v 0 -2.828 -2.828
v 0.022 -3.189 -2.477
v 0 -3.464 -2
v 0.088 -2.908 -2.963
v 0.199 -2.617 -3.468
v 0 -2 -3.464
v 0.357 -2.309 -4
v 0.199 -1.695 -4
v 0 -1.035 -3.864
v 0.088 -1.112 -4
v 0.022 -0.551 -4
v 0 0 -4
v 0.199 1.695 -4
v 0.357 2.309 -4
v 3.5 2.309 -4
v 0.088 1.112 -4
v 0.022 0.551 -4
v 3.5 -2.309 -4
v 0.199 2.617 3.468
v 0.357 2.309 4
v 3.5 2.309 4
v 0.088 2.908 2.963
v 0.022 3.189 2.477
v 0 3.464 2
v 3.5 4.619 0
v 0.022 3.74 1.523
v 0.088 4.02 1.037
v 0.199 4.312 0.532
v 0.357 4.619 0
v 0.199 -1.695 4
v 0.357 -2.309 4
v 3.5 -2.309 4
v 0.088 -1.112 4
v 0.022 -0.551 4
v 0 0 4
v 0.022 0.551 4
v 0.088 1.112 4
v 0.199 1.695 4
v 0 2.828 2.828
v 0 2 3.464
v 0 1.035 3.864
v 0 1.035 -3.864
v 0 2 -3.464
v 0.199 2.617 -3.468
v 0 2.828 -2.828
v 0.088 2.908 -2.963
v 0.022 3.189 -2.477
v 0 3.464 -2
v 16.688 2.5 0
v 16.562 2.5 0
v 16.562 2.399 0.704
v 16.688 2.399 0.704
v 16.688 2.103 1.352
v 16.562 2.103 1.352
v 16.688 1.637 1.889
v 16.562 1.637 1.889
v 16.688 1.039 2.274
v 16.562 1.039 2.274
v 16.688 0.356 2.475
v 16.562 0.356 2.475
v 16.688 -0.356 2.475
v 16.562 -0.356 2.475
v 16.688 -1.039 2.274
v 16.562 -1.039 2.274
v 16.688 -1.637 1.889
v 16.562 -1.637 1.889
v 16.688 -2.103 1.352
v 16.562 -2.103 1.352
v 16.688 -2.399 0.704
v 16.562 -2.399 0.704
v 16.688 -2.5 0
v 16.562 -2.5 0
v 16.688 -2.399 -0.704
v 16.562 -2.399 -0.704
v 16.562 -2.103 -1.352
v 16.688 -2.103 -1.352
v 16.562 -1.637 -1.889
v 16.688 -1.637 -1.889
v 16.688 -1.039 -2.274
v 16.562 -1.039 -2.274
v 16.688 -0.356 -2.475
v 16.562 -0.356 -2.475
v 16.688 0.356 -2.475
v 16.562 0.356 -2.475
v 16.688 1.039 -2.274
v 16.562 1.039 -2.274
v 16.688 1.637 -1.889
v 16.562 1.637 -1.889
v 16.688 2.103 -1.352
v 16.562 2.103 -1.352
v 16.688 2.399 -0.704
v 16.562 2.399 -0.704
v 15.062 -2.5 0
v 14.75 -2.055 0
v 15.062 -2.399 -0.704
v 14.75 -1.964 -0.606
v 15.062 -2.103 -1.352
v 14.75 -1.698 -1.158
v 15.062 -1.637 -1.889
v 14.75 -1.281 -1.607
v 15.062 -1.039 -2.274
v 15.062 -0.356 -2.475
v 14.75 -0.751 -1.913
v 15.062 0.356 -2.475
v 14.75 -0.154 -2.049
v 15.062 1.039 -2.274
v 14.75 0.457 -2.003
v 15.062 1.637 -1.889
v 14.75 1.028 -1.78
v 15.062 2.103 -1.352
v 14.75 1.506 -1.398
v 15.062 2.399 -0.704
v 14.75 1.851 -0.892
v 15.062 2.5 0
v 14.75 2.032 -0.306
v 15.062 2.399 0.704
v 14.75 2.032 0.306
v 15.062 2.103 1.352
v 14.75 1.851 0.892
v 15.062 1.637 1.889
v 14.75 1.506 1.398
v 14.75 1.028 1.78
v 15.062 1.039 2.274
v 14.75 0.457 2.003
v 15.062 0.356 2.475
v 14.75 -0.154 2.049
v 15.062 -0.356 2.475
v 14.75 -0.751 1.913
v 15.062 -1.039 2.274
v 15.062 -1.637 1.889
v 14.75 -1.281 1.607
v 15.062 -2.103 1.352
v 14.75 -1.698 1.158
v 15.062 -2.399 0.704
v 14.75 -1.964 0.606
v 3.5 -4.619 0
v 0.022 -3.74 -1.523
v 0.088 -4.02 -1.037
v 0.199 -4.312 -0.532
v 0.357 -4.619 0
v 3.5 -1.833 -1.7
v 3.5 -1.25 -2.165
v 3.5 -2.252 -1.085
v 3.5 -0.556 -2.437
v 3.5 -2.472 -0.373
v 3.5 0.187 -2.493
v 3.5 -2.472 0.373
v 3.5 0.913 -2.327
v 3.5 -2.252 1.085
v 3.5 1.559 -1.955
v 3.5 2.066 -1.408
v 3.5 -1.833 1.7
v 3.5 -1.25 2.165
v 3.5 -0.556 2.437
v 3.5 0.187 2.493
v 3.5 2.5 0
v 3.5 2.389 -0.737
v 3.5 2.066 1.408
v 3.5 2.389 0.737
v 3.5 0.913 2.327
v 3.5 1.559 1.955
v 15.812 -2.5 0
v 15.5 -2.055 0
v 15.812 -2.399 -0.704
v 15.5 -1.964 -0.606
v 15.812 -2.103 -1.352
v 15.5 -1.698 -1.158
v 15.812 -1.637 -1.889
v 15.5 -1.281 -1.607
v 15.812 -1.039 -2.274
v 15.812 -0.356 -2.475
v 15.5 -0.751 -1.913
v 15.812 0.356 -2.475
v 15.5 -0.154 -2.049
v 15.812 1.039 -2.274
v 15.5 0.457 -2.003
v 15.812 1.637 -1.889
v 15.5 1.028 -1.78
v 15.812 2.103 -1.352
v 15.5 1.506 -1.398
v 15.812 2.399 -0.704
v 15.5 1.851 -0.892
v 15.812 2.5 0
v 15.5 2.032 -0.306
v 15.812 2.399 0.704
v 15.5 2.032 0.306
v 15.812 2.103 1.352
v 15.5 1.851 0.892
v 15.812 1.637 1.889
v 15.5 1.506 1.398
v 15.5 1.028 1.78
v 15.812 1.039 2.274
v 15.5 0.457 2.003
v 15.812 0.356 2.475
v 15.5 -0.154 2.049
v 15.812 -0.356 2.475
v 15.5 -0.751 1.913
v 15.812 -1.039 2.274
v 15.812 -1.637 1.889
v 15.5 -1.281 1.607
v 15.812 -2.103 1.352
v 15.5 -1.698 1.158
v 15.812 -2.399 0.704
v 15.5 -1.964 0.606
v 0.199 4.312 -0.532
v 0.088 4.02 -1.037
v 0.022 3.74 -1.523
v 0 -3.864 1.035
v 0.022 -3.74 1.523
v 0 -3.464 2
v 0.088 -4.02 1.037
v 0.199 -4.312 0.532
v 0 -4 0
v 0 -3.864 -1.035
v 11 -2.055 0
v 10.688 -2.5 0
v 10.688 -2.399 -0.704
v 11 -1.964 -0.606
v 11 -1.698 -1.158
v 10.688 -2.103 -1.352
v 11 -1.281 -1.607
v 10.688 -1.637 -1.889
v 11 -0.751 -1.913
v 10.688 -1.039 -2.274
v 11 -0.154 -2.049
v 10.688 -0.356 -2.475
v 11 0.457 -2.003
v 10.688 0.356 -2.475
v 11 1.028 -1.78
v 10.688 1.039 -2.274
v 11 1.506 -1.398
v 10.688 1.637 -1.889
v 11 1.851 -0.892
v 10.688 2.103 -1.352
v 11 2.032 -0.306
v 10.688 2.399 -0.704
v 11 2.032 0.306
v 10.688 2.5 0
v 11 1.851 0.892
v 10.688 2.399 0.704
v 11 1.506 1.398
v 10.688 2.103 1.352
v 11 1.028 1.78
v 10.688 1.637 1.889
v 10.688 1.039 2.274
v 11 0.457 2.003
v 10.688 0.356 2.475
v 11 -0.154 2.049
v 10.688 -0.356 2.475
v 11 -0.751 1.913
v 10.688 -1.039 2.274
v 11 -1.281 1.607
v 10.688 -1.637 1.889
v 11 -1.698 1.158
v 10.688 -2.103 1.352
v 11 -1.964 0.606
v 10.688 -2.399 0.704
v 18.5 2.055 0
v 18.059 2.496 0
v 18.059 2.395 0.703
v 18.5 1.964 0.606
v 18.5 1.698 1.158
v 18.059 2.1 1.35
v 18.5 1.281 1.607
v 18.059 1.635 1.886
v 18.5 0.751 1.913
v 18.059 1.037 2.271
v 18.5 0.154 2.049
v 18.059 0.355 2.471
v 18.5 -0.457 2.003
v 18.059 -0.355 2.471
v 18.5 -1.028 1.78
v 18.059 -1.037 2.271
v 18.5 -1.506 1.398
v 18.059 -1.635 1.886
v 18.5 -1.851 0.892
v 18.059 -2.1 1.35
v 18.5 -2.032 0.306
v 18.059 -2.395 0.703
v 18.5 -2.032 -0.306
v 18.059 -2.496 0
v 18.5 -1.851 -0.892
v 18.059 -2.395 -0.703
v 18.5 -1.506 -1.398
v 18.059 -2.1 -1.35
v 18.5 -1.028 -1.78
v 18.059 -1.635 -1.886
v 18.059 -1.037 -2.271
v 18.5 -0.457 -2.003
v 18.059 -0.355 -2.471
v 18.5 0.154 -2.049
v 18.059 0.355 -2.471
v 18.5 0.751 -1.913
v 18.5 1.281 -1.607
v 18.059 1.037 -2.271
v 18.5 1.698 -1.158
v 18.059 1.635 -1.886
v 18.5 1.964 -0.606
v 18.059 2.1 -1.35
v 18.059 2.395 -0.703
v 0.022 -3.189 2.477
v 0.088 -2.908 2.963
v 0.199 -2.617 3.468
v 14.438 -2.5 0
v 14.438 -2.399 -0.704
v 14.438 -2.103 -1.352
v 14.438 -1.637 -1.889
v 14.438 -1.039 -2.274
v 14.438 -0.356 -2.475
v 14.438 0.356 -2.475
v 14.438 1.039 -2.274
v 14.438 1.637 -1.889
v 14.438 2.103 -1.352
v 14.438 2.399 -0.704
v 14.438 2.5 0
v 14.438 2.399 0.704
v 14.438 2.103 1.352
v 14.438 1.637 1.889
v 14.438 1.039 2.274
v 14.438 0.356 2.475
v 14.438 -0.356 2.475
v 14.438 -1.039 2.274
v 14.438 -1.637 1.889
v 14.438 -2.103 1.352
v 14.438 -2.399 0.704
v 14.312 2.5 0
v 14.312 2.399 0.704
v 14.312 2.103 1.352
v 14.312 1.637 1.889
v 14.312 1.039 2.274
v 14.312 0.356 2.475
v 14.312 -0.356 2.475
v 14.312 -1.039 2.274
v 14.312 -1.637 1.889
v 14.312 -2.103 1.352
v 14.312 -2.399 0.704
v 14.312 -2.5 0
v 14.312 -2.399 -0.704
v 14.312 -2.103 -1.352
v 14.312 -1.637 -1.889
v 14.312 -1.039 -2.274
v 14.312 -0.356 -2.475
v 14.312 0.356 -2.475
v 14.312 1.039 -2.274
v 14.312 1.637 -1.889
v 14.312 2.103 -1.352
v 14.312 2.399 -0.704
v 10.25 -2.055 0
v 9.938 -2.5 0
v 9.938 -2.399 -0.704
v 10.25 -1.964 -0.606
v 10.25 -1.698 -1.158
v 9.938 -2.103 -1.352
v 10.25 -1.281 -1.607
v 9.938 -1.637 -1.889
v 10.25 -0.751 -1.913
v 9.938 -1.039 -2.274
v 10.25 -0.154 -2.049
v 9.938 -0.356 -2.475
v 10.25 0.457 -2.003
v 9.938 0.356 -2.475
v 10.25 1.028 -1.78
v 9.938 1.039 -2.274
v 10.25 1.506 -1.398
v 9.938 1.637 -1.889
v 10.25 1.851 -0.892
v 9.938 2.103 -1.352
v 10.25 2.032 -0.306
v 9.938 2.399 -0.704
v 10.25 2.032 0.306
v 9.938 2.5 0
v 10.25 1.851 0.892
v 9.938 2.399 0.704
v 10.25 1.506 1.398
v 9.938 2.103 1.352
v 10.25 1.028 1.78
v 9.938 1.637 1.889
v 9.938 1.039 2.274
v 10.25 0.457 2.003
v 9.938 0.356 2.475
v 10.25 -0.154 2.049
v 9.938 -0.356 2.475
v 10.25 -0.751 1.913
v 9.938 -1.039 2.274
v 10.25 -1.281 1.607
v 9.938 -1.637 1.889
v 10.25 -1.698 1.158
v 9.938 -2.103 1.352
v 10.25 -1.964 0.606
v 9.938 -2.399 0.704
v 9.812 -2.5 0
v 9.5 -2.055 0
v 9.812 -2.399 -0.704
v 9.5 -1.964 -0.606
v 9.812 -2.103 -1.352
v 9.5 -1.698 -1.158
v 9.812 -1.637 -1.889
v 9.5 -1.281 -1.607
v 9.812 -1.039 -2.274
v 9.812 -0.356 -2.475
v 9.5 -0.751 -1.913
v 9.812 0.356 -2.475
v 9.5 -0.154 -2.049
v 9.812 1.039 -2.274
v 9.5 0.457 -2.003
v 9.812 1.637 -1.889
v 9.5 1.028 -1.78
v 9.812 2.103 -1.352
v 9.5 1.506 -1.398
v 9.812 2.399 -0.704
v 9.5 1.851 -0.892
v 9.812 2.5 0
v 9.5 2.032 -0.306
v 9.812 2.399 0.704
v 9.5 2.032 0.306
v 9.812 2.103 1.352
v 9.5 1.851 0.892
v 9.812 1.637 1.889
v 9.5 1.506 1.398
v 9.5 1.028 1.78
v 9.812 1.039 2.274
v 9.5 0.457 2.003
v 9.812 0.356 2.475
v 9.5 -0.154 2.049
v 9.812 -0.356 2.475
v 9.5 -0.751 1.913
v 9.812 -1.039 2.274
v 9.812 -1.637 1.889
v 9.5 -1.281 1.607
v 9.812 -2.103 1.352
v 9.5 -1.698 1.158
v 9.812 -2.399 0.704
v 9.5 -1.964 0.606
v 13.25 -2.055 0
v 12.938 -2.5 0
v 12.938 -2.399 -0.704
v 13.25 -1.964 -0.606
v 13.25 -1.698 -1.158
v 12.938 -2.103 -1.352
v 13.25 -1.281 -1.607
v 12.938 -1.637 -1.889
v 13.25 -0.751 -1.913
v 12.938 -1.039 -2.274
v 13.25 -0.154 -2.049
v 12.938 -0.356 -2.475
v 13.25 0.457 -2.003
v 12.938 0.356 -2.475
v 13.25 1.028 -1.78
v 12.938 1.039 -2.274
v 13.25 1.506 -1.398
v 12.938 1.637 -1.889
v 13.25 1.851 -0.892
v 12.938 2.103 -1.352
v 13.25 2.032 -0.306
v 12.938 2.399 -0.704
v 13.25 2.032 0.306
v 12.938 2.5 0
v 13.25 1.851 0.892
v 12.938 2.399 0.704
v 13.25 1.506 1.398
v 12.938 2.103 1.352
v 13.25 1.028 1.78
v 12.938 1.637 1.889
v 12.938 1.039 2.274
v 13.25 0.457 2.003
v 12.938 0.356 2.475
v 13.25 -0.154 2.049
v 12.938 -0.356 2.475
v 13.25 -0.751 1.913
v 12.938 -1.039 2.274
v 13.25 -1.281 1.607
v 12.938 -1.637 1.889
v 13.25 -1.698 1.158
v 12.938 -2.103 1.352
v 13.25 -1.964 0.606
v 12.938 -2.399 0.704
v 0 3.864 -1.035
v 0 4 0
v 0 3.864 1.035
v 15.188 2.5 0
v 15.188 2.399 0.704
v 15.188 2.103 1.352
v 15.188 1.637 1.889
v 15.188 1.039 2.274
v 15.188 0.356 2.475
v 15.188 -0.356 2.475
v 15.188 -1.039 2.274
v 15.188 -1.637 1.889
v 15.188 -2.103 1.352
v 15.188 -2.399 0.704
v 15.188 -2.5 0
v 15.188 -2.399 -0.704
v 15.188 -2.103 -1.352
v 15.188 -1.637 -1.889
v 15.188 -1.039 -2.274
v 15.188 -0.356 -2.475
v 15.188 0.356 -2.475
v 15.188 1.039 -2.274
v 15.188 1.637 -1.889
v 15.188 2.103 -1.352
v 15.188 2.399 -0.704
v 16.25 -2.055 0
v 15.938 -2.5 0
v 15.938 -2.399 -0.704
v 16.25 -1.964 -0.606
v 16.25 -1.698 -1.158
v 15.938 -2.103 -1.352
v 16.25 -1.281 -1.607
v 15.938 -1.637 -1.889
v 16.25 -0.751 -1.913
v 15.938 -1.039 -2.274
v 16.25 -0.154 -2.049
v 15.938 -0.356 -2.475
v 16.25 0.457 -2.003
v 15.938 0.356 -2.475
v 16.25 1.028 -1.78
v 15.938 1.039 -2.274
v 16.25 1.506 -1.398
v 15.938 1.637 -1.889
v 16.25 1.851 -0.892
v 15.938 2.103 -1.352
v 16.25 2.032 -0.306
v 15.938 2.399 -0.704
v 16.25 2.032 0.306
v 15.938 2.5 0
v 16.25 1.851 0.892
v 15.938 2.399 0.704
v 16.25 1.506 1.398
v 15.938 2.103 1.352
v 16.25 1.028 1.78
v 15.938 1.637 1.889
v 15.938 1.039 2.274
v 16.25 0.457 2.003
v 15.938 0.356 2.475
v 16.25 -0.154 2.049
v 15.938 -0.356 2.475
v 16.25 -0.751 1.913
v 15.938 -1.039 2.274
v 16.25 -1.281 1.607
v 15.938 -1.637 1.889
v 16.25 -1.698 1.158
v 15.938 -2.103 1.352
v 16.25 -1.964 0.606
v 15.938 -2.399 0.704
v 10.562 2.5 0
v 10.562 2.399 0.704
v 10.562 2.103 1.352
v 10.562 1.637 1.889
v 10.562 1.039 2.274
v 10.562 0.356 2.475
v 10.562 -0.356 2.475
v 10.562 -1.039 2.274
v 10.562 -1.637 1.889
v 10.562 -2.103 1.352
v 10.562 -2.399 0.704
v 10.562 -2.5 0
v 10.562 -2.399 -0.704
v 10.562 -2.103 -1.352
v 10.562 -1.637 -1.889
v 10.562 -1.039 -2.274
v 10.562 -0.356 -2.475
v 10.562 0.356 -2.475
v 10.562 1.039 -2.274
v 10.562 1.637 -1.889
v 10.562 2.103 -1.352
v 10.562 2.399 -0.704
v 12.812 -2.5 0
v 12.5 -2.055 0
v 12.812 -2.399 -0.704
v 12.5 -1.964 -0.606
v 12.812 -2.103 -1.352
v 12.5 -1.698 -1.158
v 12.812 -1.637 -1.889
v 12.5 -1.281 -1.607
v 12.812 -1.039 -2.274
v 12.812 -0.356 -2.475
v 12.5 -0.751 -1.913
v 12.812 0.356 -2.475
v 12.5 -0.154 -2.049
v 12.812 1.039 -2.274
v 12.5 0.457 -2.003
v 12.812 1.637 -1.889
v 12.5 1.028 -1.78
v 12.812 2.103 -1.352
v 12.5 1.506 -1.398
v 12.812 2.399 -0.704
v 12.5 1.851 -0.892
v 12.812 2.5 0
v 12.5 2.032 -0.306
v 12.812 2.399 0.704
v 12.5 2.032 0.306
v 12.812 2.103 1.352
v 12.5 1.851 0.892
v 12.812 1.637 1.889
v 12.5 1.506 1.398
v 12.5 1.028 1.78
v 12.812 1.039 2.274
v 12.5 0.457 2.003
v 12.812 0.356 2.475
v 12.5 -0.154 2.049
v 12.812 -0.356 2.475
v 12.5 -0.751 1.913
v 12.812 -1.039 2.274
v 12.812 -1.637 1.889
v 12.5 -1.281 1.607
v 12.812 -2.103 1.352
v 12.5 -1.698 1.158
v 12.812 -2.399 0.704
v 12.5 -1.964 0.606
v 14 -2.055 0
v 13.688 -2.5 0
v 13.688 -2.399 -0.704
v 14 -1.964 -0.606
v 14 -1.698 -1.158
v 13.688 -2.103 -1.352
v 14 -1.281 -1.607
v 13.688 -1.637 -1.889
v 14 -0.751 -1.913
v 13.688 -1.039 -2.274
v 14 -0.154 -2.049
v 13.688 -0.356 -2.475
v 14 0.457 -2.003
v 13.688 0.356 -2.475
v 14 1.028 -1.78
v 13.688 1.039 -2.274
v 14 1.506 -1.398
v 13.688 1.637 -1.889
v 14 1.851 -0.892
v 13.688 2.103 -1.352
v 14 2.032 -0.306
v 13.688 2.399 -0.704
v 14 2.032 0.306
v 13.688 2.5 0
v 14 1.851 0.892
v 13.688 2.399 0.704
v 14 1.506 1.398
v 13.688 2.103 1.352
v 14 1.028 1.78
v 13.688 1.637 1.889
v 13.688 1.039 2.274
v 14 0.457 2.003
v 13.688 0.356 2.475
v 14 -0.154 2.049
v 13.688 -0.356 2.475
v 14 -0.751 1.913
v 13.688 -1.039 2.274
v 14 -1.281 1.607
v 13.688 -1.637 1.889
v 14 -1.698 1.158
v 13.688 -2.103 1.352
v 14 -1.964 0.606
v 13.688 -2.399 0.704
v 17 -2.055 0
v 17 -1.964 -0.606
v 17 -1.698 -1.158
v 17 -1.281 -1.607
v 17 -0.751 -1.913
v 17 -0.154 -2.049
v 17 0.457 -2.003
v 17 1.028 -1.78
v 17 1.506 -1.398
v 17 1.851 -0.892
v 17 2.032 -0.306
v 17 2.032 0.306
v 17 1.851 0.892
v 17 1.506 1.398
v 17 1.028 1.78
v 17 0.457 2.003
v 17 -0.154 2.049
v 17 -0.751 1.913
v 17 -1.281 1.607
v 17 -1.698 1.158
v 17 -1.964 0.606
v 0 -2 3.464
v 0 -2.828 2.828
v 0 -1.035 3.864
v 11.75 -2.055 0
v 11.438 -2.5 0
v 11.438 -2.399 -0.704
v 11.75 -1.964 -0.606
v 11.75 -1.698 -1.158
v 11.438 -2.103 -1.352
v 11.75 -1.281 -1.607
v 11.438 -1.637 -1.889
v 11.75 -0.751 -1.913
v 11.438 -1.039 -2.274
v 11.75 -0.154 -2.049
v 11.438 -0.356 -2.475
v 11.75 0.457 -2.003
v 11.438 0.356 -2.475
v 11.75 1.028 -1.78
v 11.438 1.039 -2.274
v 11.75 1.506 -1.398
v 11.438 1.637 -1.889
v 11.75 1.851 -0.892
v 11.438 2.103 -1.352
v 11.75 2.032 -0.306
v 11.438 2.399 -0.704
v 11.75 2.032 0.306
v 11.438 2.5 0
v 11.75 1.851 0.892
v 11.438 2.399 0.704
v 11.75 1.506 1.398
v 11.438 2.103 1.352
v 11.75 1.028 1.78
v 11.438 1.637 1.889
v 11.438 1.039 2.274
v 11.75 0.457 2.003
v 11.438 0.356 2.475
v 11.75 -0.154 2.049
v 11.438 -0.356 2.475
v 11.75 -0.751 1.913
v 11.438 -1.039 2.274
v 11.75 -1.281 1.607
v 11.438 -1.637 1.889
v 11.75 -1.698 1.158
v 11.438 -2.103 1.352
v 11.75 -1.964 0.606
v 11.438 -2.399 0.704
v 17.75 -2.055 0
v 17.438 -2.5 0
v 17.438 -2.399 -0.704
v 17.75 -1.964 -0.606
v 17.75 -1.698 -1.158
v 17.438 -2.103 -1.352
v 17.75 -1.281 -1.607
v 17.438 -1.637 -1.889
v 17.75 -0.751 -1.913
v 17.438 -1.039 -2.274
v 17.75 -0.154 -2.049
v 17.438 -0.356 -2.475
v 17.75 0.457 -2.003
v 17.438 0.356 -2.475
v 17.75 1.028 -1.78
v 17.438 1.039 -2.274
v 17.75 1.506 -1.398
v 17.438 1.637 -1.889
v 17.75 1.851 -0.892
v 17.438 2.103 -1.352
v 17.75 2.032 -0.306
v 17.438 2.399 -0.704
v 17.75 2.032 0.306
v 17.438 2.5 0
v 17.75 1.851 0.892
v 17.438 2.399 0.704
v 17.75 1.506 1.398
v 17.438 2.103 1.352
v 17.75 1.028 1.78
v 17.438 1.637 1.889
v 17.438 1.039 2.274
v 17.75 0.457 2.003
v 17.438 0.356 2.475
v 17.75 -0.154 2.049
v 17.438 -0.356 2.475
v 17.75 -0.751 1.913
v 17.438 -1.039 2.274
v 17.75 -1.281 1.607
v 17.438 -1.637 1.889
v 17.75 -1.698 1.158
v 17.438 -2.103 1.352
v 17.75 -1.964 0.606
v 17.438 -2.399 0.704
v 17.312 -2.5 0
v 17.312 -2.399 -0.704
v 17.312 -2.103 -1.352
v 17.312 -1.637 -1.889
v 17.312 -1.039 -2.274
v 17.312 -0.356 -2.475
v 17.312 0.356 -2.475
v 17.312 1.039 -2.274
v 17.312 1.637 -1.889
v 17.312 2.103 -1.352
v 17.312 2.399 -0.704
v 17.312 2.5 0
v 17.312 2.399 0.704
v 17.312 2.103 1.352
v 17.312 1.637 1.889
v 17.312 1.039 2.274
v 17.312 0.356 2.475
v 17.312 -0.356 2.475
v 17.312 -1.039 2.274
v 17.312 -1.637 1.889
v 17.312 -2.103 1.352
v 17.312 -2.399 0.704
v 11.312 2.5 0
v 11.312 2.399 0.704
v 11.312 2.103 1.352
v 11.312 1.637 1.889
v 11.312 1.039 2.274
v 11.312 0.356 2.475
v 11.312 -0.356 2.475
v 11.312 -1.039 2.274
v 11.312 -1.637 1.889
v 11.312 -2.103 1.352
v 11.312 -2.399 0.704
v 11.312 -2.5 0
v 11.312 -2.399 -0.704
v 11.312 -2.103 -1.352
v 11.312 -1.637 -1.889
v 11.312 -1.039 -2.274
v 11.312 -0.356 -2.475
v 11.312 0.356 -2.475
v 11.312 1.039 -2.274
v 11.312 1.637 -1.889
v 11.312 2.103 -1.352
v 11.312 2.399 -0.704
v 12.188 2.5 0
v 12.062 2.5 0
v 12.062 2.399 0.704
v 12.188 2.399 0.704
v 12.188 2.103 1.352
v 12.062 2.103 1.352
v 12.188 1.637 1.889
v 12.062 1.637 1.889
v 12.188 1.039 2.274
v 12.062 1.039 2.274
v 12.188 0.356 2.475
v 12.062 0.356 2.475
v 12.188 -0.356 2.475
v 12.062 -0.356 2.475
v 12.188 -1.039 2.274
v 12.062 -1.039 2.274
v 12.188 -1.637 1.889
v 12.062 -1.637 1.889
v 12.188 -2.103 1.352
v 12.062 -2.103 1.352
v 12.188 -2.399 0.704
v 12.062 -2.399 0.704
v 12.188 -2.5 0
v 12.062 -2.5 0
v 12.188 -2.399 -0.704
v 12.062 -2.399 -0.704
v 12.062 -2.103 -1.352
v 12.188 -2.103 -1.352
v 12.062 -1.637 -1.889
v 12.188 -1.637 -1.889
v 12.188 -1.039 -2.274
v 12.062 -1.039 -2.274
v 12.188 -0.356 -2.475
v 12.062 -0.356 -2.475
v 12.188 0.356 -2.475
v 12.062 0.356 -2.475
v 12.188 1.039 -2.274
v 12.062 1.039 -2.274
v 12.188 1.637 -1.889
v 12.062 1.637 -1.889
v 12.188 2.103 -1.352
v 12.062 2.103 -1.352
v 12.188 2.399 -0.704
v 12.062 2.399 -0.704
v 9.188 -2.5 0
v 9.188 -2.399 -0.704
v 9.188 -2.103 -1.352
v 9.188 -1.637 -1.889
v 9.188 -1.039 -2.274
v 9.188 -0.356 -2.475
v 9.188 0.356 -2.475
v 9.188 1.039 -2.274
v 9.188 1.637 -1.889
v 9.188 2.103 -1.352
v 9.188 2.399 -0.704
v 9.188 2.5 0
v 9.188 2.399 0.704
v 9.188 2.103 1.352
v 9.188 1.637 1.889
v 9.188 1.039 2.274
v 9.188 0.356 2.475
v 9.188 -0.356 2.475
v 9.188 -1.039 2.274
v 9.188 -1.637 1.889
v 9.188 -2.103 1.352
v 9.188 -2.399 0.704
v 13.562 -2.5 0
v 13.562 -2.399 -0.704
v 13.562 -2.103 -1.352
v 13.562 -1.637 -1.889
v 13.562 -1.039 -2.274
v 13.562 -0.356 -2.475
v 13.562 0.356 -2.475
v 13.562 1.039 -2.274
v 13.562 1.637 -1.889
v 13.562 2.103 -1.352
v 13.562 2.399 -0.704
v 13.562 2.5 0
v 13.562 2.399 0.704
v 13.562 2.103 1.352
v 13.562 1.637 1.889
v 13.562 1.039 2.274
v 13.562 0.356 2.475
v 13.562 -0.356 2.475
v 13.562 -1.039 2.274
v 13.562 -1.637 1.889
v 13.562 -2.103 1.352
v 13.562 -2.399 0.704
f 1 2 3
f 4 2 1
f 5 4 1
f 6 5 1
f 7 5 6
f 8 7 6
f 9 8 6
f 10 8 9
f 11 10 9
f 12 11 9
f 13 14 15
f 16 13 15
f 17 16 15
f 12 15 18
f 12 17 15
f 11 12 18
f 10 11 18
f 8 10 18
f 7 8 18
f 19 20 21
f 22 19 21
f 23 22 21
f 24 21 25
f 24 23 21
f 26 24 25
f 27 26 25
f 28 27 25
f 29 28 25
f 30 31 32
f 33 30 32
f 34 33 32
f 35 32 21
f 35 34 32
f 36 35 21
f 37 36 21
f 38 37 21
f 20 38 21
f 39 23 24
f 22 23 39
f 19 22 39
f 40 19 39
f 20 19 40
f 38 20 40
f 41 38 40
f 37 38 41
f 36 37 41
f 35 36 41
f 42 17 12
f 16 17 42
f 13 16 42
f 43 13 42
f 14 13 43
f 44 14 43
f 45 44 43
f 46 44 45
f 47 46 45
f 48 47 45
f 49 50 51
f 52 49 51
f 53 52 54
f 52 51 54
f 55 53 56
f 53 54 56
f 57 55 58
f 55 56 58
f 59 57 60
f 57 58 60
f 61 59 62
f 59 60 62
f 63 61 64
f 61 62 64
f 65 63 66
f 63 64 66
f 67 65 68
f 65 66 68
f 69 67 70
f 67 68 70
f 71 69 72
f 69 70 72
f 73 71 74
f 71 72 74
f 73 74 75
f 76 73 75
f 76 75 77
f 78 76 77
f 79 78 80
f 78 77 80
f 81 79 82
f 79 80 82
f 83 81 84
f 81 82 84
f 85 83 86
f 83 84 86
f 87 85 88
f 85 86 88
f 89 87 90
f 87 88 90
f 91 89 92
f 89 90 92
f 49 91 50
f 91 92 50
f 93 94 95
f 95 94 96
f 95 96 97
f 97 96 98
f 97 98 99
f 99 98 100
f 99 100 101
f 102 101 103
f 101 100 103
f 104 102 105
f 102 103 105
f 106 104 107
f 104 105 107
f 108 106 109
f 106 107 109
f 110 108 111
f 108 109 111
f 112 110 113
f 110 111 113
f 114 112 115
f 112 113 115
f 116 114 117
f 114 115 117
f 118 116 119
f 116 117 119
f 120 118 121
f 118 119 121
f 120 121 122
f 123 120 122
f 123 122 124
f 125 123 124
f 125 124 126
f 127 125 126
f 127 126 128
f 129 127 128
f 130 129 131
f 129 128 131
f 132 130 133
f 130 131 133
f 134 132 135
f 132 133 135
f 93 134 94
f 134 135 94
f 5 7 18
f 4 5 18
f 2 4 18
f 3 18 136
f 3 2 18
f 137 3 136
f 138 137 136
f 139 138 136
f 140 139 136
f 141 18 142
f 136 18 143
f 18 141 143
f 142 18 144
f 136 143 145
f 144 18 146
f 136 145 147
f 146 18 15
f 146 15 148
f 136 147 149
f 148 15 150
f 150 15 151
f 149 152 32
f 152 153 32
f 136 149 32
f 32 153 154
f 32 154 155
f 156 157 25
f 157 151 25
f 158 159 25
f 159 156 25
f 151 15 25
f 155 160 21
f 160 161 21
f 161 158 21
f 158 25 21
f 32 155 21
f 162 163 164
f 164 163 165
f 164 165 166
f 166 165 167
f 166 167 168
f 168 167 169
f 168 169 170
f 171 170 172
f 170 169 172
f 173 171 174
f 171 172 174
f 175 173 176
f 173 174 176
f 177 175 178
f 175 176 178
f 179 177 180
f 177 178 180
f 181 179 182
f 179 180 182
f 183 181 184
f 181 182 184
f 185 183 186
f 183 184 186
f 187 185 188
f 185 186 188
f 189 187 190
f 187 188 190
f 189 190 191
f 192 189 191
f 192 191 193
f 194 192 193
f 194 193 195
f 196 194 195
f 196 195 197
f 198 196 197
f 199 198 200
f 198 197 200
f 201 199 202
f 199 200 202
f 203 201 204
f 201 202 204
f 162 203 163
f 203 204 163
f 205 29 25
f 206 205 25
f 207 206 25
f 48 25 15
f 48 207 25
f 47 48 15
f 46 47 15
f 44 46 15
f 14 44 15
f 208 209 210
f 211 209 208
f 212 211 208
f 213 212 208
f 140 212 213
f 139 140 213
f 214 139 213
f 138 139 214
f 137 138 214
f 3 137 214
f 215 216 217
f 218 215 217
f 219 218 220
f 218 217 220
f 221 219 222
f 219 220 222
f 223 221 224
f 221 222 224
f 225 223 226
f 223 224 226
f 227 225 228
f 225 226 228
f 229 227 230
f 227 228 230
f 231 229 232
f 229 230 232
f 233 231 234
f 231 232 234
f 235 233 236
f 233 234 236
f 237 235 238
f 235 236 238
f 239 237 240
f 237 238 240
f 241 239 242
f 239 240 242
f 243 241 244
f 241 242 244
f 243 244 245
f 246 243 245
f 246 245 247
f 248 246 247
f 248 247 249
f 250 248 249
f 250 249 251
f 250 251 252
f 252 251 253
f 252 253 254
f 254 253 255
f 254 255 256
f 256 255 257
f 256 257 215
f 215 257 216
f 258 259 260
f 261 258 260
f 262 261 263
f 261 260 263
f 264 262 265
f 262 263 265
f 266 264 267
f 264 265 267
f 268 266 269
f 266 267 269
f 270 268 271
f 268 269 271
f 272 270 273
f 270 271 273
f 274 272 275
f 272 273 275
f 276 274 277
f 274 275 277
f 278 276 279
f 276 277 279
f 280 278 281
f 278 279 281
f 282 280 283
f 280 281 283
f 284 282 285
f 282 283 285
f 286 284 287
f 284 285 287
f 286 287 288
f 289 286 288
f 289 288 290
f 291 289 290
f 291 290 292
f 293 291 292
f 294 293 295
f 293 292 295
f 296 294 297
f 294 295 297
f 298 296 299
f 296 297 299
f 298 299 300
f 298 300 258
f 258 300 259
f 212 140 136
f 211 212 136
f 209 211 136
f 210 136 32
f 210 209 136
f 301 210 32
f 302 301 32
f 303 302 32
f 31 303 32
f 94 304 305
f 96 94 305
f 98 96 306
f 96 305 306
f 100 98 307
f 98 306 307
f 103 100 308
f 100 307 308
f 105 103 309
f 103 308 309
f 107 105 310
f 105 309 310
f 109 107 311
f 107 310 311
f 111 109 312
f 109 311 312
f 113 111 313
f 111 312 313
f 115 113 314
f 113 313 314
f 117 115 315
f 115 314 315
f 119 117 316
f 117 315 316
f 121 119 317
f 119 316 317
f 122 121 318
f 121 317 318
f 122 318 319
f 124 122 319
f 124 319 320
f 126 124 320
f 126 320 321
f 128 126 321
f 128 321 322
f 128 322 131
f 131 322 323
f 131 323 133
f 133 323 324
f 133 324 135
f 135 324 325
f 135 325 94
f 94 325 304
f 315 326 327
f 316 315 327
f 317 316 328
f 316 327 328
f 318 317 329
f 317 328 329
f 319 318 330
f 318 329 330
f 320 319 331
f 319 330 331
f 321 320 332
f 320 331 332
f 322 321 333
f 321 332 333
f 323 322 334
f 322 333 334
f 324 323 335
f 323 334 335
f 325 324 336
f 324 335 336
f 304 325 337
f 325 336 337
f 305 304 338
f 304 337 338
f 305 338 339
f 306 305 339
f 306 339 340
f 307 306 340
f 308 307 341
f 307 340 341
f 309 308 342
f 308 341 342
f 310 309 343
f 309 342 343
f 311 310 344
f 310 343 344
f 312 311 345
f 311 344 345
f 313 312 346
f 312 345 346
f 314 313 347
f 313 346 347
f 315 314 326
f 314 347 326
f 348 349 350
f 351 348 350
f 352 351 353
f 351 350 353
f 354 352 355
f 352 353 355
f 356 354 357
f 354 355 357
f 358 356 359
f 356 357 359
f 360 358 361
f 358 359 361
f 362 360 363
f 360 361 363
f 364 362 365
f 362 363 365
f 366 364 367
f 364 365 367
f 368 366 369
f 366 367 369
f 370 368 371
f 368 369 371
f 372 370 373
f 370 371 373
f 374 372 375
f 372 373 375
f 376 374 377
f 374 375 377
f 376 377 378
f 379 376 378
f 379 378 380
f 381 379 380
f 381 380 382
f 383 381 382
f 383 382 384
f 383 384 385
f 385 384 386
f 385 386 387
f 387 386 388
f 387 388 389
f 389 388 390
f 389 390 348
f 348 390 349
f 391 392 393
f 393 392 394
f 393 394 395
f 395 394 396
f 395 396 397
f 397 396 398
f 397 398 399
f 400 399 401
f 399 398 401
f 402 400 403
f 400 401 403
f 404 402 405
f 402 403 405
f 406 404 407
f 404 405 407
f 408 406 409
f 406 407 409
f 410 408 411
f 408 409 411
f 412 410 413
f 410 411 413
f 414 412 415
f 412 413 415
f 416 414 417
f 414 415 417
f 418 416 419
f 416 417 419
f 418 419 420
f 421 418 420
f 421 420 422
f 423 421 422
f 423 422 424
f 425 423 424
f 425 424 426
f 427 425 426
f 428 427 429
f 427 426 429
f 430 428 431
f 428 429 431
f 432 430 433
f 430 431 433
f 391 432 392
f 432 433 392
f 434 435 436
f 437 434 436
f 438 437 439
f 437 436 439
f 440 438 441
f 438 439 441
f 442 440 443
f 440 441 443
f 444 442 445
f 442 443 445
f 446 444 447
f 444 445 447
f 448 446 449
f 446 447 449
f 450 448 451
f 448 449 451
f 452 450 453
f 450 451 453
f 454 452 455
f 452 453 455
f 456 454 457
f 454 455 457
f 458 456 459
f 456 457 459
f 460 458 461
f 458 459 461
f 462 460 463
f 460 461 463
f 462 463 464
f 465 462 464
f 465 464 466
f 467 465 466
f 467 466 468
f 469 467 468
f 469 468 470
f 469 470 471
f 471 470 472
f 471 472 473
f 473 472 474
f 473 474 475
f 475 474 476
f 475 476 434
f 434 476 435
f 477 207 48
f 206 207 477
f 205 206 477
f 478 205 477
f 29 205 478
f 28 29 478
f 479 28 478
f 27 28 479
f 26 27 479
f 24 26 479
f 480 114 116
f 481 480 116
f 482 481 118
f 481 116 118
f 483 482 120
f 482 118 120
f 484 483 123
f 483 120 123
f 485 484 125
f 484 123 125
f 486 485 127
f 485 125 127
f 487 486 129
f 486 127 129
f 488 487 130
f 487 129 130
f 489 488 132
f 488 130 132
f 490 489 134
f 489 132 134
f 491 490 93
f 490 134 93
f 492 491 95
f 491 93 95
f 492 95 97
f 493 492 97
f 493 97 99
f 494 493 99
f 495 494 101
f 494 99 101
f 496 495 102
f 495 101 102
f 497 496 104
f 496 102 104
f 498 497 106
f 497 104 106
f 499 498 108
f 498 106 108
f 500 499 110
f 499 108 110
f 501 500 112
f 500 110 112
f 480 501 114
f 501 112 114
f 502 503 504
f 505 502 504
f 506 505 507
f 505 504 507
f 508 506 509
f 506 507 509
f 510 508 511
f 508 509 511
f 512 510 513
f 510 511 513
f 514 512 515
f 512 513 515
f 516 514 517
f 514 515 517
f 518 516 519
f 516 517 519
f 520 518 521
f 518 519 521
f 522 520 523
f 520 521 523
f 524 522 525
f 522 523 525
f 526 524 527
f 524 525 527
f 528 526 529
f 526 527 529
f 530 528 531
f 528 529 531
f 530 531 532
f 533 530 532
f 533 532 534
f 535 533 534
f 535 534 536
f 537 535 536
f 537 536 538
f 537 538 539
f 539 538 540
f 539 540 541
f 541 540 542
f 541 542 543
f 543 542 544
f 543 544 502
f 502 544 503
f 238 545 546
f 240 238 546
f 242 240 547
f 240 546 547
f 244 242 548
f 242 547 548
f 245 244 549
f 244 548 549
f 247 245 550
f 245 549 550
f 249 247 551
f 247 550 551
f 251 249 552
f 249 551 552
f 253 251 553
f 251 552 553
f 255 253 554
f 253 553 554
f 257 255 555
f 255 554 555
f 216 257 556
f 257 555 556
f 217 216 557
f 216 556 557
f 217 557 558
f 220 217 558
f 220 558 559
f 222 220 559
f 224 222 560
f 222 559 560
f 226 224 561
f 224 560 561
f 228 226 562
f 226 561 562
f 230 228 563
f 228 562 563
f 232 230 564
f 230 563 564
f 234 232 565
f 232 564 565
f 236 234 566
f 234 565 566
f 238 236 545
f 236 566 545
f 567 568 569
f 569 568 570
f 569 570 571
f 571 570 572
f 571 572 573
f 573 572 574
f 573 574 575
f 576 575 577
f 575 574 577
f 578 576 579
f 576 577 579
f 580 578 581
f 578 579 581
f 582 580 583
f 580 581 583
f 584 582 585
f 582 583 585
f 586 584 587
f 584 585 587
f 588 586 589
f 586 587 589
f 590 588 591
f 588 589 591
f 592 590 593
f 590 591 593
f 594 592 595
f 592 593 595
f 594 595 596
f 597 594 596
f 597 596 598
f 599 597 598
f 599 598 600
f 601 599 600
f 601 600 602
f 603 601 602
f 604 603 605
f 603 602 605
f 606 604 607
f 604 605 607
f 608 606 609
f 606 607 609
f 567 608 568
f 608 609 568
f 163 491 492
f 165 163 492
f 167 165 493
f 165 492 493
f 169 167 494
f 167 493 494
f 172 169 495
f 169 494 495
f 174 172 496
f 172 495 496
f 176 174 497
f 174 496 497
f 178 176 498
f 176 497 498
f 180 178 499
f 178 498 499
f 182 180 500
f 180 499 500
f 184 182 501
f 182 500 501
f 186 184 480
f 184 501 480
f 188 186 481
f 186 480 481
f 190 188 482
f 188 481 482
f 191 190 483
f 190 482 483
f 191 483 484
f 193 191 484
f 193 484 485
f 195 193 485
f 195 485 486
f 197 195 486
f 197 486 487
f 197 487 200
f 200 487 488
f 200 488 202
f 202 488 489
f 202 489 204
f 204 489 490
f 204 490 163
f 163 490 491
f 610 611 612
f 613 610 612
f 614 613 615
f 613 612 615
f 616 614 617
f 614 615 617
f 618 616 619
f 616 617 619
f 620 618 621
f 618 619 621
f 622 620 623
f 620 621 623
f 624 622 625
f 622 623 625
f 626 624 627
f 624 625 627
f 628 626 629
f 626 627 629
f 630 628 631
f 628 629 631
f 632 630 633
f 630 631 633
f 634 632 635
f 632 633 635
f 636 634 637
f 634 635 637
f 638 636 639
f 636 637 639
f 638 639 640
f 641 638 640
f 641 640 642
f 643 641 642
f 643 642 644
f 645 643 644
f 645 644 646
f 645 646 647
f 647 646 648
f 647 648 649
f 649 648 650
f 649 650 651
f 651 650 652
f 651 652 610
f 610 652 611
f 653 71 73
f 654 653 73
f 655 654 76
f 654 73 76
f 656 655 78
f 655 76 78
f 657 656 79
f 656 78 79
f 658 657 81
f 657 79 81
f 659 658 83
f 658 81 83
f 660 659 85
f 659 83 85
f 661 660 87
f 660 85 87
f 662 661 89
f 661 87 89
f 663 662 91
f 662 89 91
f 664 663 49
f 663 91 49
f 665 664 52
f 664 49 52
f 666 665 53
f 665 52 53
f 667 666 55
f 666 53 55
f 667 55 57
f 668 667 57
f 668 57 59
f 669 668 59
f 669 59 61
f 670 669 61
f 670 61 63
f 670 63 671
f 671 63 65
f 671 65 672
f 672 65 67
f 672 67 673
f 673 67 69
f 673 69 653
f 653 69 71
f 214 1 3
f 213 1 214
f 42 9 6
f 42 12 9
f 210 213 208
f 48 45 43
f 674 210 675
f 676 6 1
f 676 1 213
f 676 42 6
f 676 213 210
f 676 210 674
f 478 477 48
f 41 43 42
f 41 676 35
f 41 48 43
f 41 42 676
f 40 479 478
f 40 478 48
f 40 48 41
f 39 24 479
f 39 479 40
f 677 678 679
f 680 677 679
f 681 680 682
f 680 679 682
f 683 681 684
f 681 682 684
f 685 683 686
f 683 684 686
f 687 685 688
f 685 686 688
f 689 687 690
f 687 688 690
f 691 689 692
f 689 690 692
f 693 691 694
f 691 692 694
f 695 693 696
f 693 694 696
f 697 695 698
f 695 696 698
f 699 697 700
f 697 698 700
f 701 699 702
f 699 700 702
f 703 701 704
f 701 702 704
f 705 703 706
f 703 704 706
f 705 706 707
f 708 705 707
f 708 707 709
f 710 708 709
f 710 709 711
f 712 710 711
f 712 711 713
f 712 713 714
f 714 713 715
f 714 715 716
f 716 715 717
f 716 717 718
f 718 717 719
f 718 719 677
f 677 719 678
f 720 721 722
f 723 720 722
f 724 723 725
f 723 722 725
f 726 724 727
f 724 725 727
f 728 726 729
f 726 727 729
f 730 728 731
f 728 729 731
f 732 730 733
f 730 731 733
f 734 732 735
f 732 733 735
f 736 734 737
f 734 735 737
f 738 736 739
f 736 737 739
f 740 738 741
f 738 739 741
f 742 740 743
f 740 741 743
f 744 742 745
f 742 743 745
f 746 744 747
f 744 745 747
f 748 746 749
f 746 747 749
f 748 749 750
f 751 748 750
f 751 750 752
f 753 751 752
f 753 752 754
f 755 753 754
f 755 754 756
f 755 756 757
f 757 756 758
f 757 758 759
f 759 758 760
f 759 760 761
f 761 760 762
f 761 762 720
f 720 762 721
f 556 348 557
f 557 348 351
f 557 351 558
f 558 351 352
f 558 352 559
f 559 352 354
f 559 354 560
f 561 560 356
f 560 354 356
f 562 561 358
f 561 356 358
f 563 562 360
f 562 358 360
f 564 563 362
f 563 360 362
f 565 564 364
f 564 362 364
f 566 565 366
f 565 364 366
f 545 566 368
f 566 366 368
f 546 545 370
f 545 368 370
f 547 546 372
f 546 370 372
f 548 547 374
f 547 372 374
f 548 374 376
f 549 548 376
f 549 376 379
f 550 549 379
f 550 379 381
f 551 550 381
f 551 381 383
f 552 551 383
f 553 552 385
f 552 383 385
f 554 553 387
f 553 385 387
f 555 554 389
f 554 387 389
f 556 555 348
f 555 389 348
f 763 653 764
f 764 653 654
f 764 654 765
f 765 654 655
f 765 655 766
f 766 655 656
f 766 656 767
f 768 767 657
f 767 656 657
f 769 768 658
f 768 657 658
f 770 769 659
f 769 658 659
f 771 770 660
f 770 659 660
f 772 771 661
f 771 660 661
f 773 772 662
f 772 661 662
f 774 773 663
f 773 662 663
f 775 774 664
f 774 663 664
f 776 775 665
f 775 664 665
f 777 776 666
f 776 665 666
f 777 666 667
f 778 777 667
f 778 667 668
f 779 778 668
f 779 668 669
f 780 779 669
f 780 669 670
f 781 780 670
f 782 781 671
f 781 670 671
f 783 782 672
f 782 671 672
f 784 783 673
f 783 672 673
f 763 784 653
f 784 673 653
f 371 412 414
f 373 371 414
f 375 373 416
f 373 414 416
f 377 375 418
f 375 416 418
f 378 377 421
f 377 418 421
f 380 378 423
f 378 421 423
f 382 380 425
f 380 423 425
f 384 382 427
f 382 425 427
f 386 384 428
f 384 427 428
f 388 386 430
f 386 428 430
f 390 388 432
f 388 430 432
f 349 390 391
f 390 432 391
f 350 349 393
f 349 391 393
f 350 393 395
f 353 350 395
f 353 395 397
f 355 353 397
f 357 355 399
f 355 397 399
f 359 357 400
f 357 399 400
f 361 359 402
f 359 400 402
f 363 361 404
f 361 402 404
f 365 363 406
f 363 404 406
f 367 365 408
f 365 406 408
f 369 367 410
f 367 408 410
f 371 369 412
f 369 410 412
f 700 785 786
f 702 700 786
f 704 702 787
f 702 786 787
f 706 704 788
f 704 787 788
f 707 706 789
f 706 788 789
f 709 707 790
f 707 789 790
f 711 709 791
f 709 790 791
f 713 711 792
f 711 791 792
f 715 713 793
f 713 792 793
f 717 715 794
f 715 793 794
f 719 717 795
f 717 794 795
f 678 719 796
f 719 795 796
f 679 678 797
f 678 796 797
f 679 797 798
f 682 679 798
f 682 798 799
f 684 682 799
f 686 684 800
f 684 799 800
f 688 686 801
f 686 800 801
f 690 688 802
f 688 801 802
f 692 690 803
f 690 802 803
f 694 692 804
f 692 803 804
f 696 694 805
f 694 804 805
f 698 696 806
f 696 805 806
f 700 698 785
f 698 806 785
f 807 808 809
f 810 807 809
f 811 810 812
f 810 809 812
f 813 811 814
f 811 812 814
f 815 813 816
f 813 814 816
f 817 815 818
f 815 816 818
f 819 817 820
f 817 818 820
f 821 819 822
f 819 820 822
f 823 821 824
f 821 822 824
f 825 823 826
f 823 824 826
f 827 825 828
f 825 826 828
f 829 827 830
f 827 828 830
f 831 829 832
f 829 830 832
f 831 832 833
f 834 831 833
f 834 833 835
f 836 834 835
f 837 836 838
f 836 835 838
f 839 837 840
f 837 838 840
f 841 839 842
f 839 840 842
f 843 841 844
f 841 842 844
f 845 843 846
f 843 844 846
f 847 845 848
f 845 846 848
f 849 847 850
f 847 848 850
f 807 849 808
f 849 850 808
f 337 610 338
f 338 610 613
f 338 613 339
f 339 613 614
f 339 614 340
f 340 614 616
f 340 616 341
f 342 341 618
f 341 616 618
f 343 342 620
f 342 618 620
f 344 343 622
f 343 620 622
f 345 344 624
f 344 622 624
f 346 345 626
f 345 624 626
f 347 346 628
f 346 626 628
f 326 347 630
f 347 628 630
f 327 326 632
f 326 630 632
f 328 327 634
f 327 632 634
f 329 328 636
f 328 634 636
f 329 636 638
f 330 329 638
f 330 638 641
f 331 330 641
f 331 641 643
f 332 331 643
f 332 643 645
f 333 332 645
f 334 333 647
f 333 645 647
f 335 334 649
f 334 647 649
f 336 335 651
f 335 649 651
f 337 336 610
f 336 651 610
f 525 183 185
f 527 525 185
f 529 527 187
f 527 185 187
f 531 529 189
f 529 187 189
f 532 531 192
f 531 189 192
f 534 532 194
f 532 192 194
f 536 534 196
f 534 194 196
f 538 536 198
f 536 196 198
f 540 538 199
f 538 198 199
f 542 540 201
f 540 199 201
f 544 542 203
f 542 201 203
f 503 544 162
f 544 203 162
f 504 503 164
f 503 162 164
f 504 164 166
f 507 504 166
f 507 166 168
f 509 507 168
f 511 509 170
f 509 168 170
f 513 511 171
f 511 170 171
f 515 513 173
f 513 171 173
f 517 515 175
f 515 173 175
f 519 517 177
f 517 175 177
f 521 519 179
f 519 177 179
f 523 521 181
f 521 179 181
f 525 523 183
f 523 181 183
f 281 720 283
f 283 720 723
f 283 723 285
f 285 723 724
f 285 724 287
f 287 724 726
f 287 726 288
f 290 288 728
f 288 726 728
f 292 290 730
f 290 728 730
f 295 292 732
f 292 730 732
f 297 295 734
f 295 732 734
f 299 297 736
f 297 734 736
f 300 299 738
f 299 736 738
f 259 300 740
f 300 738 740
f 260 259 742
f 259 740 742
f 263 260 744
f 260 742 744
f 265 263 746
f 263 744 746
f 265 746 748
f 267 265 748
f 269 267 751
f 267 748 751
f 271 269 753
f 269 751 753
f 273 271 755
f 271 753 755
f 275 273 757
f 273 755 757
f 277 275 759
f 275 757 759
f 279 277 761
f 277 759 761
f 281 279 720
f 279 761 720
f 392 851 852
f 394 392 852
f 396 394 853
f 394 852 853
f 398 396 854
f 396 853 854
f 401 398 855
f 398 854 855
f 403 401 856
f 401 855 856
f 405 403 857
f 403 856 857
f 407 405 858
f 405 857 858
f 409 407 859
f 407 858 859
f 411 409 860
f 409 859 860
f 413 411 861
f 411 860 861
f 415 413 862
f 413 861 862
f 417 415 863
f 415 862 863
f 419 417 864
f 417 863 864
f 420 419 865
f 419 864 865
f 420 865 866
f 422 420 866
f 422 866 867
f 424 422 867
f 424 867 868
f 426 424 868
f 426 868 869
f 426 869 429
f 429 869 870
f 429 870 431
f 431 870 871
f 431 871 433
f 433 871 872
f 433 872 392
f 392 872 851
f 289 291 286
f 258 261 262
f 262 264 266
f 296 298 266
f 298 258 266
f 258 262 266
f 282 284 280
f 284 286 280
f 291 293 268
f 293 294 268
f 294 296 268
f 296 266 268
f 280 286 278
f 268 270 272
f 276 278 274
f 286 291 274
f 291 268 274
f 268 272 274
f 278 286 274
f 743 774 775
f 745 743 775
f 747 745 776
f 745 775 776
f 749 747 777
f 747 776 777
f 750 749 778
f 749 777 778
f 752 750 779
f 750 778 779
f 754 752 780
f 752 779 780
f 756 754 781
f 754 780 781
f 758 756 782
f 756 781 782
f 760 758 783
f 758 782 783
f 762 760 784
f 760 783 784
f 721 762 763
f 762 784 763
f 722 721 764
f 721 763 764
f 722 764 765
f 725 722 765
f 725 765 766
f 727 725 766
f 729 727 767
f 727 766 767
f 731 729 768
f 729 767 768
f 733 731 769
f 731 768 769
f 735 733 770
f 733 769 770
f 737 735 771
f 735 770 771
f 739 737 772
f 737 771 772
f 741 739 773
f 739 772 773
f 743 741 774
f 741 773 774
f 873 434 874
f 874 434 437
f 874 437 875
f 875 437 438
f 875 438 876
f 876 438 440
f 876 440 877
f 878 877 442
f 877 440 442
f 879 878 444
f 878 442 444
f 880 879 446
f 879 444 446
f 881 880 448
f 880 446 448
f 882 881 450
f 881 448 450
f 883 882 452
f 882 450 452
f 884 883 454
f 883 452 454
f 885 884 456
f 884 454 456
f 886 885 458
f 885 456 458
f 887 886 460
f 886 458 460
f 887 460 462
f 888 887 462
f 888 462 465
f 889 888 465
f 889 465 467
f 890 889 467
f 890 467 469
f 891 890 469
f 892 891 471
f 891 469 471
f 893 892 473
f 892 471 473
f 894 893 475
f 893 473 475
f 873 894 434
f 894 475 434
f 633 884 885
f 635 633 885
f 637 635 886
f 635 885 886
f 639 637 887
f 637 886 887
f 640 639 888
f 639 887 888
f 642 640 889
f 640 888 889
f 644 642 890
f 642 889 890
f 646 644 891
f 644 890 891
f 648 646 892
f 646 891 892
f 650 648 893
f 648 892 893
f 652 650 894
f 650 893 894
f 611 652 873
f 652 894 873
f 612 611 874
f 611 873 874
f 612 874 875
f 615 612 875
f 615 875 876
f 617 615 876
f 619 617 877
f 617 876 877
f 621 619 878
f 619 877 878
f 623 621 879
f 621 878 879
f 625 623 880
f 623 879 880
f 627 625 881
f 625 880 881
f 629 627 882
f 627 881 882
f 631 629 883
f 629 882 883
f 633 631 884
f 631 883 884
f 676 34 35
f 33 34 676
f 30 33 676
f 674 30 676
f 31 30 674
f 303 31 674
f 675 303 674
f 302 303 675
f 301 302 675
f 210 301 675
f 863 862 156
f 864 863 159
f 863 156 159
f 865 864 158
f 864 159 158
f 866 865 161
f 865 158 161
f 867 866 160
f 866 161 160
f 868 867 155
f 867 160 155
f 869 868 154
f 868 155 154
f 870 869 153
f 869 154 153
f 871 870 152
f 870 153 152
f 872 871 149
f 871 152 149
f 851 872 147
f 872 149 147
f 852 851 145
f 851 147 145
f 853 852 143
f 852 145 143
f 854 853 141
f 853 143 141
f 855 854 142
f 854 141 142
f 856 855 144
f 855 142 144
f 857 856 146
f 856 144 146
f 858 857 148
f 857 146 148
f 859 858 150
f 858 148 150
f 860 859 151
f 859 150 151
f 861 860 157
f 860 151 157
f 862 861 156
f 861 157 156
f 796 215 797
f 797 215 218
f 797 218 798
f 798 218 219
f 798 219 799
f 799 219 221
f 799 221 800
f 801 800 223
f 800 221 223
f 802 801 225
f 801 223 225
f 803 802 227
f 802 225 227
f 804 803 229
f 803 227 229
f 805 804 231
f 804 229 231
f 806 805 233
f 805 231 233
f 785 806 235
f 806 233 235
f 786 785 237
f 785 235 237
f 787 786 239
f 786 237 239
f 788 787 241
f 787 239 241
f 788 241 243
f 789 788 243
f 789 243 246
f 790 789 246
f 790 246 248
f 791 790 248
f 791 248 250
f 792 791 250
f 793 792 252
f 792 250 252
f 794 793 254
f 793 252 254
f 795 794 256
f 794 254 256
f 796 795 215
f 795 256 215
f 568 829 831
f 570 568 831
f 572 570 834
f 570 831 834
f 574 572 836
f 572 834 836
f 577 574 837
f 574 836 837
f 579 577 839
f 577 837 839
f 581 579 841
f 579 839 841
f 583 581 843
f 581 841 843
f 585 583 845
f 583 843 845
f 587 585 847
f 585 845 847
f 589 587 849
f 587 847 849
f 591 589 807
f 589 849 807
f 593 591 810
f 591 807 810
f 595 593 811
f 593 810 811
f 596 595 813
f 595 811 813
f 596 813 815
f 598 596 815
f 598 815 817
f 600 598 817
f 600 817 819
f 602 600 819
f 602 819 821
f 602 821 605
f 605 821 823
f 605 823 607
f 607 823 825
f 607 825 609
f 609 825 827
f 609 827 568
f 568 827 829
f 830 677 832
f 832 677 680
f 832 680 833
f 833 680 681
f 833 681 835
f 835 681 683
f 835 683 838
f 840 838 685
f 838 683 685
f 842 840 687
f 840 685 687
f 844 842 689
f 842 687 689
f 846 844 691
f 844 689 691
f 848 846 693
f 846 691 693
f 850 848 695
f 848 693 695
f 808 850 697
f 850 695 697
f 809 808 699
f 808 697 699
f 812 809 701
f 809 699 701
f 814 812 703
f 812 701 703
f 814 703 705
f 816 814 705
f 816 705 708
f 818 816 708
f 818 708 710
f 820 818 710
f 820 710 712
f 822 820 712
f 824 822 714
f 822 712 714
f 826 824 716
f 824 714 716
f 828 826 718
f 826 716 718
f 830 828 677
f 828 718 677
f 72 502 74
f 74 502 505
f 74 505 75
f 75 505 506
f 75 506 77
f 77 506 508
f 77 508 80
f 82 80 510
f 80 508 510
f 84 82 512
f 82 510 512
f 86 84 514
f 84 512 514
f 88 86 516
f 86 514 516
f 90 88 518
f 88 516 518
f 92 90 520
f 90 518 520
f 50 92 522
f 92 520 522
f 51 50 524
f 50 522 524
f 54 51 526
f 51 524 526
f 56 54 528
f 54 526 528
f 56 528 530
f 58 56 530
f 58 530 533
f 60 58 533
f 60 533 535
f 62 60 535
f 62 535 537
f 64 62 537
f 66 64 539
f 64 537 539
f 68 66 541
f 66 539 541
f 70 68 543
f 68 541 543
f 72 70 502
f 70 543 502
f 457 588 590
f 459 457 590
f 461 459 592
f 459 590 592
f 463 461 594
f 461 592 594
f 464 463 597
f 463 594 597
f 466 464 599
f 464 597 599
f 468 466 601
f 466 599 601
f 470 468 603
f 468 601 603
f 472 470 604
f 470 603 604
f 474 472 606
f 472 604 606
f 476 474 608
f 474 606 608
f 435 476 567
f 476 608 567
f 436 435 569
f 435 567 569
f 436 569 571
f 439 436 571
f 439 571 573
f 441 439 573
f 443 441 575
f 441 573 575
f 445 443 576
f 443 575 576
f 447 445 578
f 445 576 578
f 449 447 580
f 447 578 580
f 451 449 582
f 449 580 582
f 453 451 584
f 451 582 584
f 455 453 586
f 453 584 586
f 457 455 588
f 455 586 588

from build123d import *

# Parameters (mm, degrees)
BASEHEAD_DEPTH  = 3.5
THDSCHPAT_COUNT = 12
THDSCHPAT_PITCH = 0.75


with BuildPart() as part:
    # Sketch1 → BaseHead (new body)
    with BuildSketch(Plane(origin=(0, 0, 0), x_dir=(0, 0, -1), z_dir=(1, 0, 0))):
        Polygon((4, 2.309401077), (4, -2.309401077), (0, -4.618802154), (-4, -2.309401077), (-4, 2.309401077), (0, 4.618802154), align=None)
    extrude(amount=BASEHEAD_DEPTH)

    # BodySke → BaseBody (revolve)
    with BuildSketch(Plane.XY):
        Polygon((0, 0), (18.5, 0), (18.5, 2.055), (18.055, 2.5), (0, 2.5), align=None)
    revolve(axis=Axis((0, 0, 0), (1, 0, 0)))

    # Sketch3 → HeadChamfer (revolve, cut)
    with BuildSketch(Plane.XY):
        Polygon((0, 4), (3.244016936, 9.618802154), (3.244016936, 14.618802154), (-10, 14.618802154), (-10, 4), align=None)
    revolve(axis=Axis((0, 0, 0), (1, 0, 0)), mode=Mode.SUBTRACT)

    # ThdSchSke → ThreadSchematic (revolve, cut)
    with BuildSketch(Plane.XY):
        Polygon((9.5, -2.055), (9.188407645, -2.5), (9.188407645, -3.125), (9.811592355, -3.125), (9.811592355, -2.5), align=None)
    threadschematic = revolve(axis=Axis((-3.175, 0, 0), (1, 0, 0)), mode=Mode.SUBTRACT)

    # ThdSchPat: ThreadSchematic ×12
    with Locations(*[(i * THDSCHPAT_PITCH, 0, 0) for i in range(1, THDSCHPAT_COUNT)]):
        add(threadschematic, mode=Mode.SUBTRACT)


solid = part.part
